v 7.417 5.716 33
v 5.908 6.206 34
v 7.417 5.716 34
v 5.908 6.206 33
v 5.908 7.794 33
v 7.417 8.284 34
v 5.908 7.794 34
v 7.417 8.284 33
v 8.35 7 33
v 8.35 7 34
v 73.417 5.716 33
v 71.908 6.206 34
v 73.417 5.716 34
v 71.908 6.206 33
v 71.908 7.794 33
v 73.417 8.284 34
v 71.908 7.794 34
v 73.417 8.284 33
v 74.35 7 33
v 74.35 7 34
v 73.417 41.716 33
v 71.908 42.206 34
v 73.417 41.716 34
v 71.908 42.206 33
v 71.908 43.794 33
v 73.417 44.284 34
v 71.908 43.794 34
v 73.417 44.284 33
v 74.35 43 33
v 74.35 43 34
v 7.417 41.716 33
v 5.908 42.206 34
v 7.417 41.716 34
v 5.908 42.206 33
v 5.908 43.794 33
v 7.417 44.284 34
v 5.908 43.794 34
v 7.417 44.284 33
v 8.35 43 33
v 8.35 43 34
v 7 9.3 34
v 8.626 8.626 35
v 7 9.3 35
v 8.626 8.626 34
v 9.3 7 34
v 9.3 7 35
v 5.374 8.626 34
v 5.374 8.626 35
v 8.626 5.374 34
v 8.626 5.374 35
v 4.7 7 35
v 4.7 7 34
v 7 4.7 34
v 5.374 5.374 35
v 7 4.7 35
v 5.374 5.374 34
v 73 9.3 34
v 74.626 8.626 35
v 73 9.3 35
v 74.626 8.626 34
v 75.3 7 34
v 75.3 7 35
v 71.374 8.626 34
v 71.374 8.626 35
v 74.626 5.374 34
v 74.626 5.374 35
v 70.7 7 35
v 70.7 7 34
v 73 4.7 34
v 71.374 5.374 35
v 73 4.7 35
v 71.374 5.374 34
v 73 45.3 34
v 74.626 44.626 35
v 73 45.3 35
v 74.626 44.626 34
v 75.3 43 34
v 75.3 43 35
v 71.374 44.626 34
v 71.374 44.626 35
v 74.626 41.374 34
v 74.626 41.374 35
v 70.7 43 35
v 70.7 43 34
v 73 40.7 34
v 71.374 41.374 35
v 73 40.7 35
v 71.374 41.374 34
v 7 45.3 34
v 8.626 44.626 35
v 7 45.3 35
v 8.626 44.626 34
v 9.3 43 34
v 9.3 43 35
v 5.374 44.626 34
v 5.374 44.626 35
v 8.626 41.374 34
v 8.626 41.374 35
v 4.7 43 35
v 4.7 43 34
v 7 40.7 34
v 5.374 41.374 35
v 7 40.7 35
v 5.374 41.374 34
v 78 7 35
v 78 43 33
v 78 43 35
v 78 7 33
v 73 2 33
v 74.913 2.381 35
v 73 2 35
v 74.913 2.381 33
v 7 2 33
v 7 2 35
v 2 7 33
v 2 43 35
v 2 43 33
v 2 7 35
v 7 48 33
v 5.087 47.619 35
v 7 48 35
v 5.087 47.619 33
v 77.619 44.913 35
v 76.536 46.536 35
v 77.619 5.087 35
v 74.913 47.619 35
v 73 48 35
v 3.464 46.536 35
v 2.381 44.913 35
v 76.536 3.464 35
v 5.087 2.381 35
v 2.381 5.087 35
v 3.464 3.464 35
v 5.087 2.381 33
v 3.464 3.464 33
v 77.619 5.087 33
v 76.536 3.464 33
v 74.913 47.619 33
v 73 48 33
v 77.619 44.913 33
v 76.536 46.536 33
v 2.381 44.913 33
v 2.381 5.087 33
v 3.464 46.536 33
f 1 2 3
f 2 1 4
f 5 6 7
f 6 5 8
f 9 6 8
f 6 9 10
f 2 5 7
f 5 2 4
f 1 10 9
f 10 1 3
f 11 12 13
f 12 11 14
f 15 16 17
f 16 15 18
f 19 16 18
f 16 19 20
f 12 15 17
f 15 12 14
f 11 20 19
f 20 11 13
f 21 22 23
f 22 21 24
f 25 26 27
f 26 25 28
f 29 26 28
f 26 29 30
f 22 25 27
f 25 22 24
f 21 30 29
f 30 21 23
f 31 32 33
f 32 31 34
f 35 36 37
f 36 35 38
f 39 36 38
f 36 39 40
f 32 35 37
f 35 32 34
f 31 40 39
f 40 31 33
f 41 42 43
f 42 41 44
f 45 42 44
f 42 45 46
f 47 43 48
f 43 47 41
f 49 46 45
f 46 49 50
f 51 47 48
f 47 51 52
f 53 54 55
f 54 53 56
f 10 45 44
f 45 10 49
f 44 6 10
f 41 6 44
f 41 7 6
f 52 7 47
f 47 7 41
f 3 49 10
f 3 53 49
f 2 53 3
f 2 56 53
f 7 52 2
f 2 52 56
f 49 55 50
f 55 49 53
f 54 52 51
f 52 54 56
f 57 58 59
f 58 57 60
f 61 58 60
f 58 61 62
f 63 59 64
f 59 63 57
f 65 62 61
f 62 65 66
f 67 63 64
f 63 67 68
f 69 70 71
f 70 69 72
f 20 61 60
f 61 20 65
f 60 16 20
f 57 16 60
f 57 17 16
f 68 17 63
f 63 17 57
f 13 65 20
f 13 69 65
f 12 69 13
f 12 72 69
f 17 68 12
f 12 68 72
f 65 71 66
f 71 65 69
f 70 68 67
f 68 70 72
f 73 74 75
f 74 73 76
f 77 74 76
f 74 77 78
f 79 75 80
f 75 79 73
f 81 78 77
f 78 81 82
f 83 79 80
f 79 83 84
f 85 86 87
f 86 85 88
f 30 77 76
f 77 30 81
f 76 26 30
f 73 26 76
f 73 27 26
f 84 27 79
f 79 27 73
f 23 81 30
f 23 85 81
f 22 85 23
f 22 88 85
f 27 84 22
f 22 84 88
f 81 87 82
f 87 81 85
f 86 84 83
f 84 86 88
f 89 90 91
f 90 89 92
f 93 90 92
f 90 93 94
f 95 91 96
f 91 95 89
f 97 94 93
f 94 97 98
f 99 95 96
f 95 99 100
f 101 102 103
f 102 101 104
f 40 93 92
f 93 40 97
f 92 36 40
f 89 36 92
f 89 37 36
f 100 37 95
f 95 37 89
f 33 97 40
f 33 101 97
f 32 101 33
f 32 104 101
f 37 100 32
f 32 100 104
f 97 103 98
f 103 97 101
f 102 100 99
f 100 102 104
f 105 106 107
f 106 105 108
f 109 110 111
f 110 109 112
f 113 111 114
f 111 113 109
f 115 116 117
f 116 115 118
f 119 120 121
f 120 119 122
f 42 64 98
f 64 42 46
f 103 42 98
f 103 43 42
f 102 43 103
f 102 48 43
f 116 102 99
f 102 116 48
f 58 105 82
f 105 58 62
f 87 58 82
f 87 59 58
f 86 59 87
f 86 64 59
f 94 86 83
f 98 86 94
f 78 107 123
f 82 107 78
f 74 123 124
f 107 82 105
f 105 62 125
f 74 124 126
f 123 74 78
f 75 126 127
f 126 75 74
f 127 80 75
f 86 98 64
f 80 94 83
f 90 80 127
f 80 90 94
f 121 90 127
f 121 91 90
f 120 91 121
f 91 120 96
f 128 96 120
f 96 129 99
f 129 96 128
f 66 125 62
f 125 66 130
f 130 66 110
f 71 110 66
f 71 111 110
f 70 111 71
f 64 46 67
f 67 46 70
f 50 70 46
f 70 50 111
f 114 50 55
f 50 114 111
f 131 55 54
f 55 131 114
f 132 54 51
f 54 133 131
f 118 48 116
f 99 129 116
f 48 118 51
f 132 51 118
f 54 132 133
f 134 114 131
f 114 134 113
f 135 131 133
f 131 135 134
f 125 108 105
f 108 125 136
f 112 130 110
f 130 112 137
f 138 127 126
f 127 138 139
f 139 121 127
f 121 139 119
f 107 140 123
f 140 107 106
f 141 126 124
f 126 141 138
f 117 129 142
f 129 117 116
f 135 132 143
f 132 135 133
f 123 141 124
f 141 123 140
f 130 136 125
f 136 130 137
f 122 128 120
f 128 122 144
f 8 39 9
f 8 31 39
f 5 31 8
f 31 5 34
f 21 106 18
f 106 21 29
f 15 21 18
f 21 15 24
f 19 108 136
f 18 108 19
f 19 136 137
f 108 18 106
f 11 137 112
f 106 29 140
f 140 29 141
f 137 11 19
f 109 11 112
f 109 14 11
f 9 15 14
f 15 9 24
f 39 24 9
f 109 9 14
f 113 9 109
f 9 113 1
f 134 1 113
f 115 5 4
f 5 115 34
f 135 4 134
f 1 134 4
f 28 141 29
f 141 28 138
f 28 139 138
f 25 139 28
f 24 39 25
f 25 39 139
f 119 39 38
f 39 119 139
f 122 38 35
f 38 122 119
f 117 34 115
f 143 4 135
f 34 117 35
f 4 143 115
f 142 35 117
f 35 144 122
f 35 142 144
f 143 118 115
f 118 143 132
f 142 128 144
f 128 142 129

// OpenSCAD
translate([0,0,33]) Frontpanel(80,50,2,10);

module Frontpanel(width,depth,height,dia,dikte=2,boorgaten=true) {
 difference() {
  hull() {
   translate([dia/2+dikte,dia/2+dikte,0])cylinder(d=dia,h=height);
   translate([width-dia/2-dikte,dia/2+dikte,0])cylinder(d=dia,h=height);
   translate([width-dia/2-dikte,depth-dia/2-dikte,0])cylinder(d=dia,h=height);
   translate([dia/2+dikte,depth-dia/2-dikte,0])cylinder(d=dia,h=height);
  } 
  if(boorgaten) {
   // Boorgaten
   translate([dia/2+dikte,dia/2+dikte,-1]) cylinder(d=2.7,h=100);          
   translate([width-dia/2-dikte,dia/2+dikte,-1]) cylinder(d=2.7,h=100);       
   translate([width-dia/2-dikte,depth-dia/2-dikte,-1]) cylinder(d=2.7,h=100);       
   translate([dia/2+dikte,depth-dia/2-dikte,-1]) cylinder(d=2.7,h=100);       
   // Verzinking
   translate([dia/2+dikte,dia/2+dikte,min(dikte/2,5)]) cylinder(d=4.6,h=100);  
   translate([width-dia/2-dikte,dia/2+dikte,min(dikte/2,5)]) cylinder(d=4.6,h=100);       
   translate([width-dia/2-dikte,depth-dia/2-dikte,min(dikte/2,5)]) cylinder(d=4.6,h=100);       
   translate([dia/2+dikte,depth-dia/2-dikte,min(dikte/2,5)]) cylinder(d=4.6,h=100);          
  }
 }
}
